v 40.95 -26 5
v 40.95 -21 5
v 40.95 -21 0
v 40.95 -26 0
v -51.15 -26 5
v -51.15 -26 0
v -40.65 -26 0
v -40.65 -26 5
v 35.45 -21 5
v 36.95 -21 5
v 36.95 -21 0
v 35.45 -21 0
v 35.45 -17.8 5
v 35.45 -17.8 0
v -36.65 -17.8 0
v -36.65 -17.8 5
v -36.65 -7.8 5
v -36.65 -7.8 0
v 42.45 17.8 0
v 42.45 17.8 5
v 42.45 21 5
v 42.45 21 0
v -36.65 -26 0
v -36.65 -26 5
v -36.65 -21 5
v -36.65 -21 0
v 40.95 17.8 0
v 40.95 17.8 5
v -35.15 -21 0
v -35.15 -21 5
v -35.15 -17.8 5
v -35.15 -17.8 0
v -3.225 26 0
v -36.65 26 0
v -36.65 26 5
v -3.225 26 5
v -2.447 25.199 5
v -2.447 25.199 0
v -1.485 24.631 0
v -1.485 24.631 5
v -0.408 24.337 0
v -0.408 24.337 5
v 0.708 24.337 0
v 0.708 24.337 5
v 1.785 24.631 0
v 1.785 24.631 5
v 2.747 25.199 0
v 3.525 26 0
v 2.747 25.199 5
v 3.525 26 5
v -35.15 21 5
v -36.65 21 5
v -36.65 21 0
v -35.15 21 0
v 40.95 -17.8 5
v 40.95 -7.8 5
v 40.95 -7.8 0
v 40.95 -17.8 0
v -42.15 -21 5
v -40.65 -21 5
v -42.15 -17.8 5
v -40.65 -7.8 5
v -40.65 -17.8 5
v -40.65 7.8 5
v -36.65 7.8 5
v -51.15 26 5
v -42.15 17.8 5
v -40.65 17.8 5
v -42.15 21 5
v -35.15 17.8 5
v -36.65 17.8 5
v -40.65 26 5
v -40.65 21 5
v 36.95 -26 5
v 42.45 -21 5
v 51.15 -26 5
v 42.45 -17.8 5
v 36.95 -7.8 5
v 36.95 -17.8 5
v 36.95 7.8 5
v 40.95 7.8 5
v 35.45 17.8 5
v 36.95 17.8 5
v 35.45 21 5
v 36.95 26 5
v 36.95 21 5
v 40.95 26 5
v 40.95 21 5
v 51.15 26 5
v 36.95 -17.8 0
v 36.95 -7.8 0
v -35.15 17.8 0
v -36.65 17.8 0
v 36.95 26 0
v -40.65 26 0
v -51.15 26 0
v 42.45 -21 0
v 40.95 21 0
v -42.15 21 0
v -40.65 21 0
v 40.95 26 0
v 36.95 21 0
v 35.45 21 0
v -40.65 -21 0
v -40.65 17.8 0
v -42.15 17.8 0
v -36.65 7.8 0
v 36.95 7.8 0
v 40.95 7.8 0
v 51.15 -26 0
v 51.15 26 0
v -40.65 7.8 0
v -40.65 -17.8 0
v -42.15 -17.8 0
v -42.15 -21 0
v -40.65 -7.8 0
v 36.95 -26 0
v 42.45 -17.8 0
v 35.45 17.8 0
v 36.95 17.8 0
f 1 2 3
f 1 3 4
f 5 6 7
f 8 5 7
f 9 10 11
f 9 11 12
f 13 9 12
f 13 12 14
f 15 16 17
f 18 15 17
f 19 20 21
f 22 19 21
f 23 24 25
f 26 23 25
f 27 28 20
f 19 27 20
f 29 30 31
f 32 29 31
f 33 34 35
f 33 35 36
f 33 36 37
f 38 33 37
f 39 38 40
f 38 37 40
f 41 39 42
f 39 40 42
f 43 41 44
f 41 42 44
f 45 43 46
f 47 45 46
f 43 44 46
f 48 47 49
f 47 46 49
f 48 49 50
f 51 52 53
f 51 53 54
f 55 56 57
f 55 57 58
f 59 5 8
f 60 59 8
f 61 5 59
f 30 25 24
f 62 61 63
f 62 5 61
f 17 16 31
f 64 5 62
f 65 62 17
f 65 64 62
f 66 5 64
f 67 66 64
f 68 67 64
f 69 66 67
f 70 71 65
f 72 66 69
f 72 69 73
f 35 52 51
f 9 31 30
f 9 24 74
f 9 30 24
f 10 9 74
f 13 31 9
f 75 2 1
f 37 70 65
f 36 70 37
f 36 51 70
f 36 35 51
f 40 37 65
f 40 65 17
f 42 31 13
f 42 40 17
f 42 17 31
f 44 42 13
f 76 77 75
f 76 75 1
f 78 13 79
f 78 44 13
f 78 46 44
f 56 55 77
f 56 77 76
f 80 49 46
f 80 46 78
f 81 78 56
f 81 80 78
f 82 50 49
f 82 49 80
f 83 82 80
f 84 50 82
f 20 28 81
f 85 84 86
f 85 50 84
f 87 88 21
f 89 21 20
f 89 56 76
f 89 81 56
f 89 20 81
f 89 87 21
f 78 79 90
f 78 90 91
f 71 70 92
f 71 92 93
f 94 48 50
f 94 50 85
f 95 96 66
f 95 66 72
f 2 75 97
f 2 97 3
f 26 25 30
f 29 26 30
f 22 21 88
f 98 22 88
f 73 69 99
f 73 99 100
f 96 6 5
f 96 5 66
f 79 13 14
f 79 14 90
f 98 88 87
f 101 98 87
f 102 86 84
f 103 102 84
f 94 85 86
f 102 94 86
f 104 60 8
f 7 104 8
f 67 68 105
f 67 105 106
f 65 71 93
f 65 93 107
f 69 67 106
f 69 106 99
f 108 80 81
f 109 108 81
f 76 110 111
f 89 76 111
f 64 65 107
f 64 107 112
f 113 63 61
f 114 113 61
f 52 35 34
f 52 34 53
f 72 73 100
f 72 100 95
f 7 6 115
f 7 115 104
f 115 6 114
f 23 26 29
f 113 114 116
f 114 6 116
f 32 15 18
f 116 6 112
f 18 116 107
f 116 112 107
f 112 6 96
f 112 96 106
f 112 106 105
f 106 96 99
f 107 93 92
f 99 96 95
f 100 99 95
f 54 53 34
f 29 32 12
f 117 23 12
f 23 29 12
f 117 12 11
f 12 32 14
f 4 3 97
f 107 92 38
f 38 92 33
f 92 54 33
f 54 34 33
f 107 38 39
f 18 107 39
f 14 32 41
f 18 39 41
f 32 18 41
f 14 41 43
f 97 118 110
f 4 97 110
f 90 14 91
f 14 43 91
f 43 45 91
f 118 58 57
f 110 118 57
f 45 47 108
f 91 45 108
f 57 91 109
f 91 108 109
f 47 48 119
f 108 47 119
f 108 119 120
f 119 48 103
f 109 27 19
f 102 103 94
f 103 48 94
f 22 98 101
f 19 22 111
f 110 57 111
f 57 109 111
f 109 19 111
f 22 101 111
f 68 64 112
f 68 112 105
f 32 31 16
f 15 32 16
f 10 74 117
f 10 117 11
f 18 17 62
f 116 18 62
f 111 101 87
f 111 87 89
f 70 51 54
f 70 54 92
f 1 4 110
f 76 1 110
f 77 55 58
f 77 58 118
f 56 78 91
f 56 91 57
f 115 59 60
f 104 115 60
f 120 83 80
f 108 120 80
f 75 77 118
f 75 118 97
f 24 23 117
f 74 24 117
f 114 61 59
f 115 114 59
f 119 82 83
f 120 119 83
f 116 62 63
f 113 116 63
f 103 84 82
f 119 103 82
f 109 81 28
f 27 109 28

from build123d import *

# Parameters (mm, degrees)
SKETCH1_W           = 102.3
SKETCH1_H           = 52
BOSS_EXTRUDE1_DEPTH = 5
CUT_EXTRUDE1_DEPTH  = 5
CUT_EXTRUDE2_DEPTH  = 10
SKETCH9_R           = 4.2
CUT_EXTRUDE3_DEPTH  = 5


with BuildPart() as part:
    # Sketch1 → Boss-Extrude1 (new body)
    with BuildSketch(Plane.XY):
        Rectangle(SKETCH1_W, SKETCH1_H)
    extrude(amount=BOSS_EXTRUDE1_DEPTH)

    # Sketch3 → Cut-Extrude1 (cut)
    with BuildSketch(Plane.XY.offset(5)):
        Polygon((-36.65, 17.8), (-36.65, 7.8), (-40.65, 7.8), (-40.65, 17.8), (-42.15, 17.8), (-42.15, 21), (-40.65, 21), (-40.65, 26), (-36.65, 26), (-36.65, 21), (-35.15, 21), (-35.15, 17.8), align=None)
        Polygon((-40.65, -7.8), (-40.65, -17.8), (-42.15, -17.8), (-42.15, -21), (-40.65, -21), (-40.65, -26), (-36.65, -26), (-36.65, -21), (-35.15, -21), (-35.15, -17.8), (-36.65, -17.8), (-36.65, -7.8), align=None)
    extrude(amount=-CUT_EXTRUDE1_DEPTH, mode=Mode.SUBTRACT)

    # Sketch8 → Cut-Extrude2 (cut)
    with BuildSketch(Plane.XY.offset(5)):
        Polygon((36.95, 26), (36.95, 21), (35.45, 21), (35.45, 17.8), (36.95, 17.8), (36.95, 7.8), (40.95, 7.8), (40.95, 17.8), (42.45, 17.8), (42.45, 21), (40.95, 21), (40.95, 26), align=None)
        Polygon((40.95, -17.8), (42.45, -17.8), (42.45, -21), (40.95, -21), (40.95, -26), (36.95, -26), (36.95, -21), (35.45, -21), (35.45, -17.8), (36.95, -17.8), (36.95, -7.8), (40.95, -7.8), align=None)
    extrude(amount=-CUT_EXTRUDE2_DEPTH, mode=Mode.SUBTRACT)

    # Sketch9 → Cut-Extrude3 (cut)
    with BuildSketch(Plane.XY.offset(5)):
        with Locations((0.15, 28.5)):
            Circle(SKETCH9_R)
    extrude(amount=-CUT_EXTRUDE3_DEPTH, mode=Mode.SUBTRACT)


solid = part.part
